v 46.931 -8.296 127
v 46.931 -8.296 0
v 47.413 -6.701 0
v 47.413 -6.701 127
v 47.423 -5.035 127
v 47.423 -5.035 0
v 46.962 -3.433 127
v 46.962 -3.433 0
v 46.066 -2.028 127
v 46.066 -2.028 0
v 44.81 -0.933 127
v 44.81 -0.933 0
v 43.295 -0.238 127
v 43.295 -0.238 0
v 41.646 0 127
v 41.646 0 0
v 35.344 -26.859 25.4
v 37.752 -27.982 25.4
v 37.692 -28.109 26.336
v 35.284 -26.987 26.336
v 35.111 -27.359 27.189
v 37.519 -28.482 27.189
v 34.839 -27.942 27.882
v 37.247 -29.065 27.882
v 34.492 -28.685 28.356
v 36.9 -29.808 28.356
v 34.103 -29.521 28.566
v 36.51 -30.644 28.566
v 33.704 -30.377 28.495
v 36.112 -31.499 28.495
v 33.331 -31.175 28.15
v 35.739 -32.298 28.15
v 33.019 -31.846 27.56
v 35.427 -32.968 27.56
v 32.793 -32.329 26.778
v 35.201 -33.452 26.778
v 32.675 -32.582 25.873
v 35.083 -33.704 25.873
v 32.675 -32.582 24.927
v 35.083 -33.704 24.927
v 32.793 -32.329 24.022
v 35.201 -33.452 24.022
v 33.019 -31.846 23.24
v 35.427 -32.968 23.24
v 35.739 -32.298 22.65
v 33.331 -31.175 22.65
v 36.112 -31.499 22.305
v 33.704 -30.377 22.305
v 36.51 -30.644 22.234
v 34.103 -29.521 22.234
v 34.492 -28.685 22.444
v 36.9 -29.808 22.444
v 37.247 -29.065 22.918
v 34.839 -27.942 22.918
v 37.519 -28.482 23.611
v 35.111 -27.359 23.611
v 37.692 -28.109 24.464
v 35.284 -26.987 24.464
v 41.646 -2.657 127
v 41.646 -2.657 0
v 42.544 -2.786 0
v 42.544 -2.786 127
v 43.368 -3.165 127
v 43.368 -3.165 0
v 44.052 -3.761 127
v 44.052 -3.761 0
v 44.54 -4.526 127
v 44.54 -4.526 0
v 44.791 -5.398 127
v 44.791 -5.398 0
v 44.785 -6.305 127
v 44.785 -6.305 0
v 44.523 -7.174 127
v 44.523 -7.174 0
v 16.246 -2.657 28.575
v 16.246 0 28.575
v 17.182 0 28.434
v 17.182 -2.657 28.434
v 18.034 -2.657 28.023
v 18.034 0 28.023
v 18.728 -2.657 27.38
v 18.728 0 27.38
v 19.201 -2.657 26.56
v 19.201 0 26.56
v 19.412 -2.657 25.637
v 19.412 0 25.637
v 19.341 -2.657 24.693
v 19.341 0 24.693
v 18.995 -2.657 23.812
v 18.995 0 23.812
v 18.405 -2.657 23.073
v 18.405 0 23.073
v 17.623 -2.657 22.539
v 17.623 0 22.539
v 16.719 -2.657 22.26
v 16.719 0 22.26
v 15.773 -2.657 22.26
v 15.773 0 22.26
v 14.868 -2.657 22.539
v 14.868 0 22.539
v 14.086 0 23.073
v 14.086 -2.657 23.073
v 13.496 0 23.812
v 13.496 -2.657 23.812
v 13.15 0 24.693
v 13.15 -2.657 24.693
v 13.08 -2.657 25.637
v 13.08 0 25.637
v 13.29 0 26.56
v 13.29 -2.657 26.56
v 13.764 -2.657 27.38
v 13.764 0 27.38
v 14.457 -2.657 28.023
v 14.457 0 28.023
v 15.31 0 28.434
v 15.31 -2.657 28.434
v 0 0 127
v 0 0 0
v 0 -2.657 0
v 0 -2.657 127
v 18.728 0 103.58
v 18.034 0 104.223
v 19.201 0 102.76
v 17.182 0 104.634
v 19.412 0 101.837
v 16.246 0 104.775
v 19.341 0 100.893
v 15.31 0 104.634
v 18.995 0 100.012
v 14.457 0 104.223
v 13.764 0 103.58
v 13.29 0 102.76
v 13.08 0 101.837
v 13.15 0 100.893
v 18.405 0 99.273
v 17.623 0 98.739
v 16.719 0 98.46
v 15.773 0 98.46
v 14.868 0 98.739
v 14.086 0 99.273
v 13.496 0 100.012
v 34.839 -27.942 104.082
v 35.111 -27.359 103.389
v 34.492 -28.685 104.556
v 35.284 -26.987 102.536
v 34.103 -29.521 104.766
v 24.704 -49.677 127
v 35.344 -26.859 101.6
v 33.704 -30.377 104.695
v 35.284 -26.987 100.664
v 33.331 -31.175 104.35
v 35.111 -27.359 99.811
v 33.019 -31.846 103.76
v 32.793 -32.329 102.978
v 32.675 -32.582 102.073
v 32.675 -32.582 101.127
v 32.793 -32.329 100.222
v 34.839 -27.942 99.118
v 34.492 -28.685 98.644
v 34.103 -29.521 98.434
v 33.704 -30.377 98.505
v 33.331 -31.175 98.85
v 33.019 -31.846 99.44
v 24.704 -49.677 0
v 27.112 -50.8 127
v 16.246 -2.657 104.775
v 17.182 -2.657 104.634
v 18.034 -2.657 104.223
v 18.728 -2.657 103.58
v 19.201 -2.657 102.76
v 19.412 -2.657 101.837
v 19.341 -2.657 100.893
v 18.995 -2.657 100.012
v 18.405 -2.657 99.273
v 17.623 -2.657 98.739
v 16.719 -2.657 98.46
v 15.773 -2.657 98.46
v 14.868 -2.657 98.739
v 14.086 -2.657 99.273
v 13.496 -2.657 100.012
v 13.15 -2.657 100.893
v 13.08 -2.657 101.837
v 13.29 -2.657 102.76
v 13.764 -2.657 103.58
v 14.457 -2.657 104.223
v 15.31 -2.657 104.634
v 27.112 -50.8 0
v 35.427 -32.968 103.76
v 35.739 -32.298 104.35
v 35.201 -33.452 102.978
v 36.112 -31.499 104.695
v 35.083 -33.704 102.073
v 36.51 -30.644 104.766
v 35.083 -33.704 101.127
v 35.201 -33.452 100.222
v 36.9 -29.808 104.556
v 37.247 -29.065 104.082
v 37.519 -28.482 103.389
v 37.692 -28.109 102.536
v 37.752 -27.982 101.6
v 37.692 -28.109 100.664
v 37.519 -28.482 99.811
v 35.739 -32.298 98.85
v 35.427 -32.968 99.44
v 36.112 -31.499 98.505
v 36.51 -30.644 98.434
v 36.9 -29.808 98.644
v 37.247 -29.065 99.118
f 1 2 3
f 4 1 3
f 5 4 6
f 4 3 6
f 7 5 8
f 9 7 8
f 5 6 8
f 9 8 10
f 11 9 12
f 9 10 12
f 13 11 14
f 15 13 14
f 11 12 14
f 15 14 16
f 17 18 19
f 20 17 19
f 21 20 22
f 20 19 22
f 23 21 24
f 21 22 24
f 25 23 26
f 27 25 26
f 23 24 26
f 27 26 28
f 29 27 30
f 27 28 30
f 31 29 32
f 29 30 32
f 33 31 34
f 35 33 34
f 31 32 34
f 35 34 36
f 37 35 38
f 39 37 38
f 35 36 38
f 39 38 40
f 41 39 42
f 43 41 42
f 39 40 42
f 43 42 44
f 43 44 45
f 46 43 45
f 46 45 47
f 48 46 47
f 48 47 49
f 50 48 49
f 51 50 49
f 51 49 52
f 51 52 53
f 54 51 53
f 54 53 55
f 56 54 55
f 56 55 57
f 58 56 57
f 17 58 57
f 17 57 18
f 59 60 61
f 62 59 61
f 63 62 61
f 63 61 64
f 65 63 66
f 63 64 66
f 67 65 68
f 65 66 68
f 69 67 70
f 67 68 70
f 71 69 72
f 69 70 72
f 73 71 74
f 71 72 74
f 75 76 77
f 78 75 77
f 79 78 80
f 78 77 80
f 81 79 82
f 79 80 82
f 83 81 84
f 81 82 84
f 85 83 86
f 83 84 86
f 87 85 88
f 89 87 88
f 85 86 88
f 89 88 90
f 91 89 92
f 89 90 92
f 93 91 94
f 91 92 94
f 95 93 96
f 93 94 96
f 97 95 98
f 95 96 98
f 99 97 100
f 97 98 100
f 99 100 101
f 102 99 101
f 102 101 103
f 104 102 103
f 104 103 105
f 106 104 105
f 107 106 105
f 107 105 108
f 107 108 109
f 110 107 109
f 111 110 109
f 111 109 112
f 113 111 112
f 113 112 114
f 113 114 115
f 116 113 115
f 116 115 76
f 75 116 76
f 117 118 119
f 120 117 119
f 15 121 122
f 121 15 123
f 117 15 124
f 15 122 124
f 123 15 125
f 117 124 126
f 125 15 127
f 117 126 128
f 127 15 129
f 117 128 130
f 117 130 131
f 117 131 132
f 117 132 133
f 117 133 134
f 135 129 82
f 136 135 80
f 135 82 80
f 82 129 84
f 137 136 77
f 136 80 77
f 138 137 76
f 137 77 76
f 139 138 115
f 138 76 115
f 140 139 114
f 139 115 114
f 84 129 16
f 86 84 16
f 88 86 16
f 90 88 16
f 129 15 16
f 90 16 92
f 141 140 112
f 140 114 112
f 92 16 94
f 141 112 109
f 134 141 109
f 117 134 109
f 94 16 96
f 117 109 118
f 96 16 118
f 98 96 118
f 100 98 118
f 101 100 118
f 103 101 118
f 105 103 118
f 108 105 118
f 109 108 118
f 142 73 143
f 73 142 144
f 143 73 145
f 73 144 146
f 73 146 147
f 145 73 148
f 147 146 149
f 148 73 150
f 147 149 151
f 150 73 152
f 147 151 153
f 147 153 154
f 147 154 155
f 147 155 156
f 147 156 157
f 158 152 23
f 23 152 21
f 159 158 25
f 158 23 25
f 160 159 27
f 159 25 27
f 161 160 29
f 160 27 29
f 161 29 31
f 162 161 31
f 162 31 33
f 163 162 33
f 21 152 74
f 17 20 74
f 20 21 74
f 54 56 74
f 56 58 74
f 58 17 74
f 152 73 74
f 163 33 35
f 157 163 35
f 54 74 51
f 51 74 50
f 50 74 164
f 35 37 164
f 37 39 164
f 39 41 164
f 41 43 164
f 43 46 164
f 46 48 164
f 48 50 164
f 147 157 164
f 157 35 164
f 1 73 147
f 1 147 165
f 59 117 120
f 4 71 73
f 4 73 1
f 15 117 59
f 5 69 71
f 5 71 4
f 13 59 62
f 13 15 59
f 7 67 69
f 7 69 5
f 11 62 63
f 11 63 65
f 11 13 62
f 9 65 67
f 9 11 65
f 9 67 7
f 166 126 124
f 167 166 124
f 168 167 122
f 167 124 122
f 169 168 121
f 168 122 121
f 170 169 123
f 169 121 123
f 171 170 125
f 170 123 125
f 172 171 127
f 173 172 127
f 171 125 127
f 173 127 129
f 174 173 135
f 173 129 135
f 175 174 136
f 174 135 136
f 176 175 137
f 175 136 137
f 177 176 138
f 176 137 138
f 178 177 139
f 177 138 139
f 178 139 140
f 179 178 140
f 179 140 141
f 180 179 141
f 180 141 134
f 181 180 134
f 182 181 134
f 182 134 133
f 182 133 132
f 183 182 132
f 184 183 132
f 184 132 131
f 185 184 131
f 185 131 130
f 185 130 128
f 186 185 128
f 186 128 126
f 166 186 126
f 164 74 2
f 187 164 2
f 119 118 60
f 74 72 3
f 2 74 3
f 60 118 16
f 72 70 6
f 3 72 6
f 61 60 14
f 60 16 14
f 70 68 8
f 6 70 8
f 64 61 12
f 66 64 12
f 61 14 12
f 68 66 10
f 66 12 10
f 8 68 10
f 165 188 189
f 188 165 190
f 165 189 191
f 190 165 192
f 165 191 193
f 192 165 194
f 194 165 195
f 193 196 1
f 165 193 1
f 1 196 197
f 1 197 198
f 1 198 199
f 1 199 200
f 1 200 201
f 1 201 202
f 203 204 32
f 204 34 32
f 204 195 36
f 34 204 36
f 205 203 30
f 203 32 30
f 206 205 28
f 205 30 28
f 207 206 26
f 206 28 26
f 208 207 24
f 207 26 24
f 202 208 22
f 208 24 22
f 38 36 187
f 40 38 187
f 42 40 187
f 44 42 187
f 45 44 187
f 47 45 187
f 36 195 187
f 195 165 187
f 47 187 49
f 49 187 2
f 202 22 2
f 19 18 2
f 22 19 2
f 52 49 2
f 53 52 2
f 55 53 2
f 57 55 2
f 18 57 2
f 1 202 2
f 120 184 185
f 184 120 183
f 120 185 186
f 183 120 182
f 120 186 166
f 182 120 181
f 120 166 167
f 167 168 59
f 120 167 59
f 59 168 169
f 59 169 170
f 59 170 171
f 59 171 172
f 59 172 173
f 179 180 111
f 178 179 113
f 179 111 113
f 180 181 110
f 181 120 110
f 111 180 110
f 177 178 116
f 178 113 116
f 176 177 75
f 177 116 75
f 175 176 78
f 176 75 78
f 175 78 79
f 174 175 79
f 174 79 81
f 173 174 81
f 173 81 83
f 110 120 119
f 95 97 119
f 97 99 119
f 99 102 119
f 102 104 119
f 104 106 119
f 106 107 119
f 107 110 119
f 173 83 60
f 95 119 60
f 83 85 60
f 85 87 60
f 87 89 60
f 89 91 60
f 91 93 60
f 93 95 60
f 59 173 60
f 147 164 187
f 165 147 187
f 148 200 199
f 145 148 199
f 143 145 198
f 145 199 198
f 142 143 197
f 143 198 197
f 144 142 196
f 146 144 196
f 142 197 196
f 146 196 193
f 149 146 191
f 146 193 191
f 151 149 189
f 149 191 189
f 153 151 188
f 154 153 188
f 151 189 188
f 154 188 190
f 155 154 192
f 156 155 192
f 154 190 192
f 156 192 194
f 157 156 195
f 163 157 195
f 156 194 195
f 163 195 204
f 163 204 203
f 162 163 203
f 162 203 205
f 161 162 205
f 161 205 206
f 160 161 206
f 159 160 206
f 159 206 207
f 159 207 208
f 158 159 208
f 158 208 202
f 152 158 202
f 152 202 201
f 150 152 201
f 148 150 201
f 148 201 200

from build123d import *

# Parameters (mm, degrees)
BASE_FLANGE1_DEPTH = 127
CUT_EXTRUDE1_REACH = 146.789
SKETCH6_R          = 3.175
CUT_EXTRUDE2_REACH = 139.304
SKETCH7_R          = 3.175


# Read off the part's stored shape, not the designer's step: Base-Flange1
with BuildPart() as part:
    # Base-Flange1 outline → Base-Flange1 (new body)
    with BuildSketch(Plane.XY):
        with BuildLine():
            Line((44.523372088, -7.173652981), (24.703656185, -49.677170897))
            Line((24.703656185, -49.677170897), (27.111570966, -50.8))
            Line((27.111570966, -50.8), (46.931286869, -8.296482084))
            ThreePointArc((46.931286869, -8.296482084), (46.564368833, -2.698394652), (41.645844864, 0))
            Line((41.645844864, 0), (0, 0))
            Line((0, 0), (0, -2.65684))
            Line((0, -2.65684), (41.645844864, -2.65684))
            ThreePointArc((41.645844864, -2.65684), (44.323612704, -4.125913744), (44.523372088, -7.173652981))
        make_face()
    extrude(amount=BASE_FLANGE1_DEPTH)

    # Sketch6 → Cut-Extrude1 (cut, up to next)
    with BuildSketch(Plane(origin=(0, 0, 0), x_dir=(1, 0, 0), z_dir=(0, 1, 0)), mode=Mode.PRIVATE) as cut_extrude1_sk1:
        with Locations(Location((16.245844864, -101.6, 0), (0, 0, 270))):
            Circle(SKETCH6_R)
    cut_extrude1_tool1 = extrude(cut_extrude1_sk1.sketch, amount=-CUT_EXTRUDE1_REACH, mode=Mode.PRIVATE) & part.part
    # Sketch6 → Cut-Extrude1 (cut, up to next)
    with BuildSketch(Plane(origin=(0, 0, 0), x_dir=(1, 0, 0), z_dir=(0, 1, 0)), mode=Mode.PRIVATE) as cut_extrude1_sk2:
        with Locations(Location((16.245844864, -25.4, 0), (0, 0, 270))):
            Circle(SKETCH6_R)
    cut_extrude1_tool2 = extrude(cut_extrude1_sk2.sketch, amount=-CUT_EXTRUDE1_REACH, mode=Mode.PRIVATE) & part.part
    add(cut_extrude1_tool1.solids().sort_by_distance((16.245845, 0, 101.6))[0], mode=Mode.SUBTRACT)
    add(cut_extrude1_tool2.solids().sort_by_distance((16.245845, 0, 25.4))[0], mode=Mode.SUBTRACT)

    # Sketch7 → Cut-Extrude2 (cut, up to next)
    with BuildSketch(Plane(origin=(41.726805286, -19.457528855, 0), x_dir=(0, 0, -1), z_dir=(0.906307787036648, -0.4226182617407038, 0)), mode=Mode.PRIVATE) as cut_extrude2_sk1:
        with Locations(Location((-101.6, -12.580218597, 0), (0, 0, 90))):
            Circle(SKETCH7_R)
    cut_extrude2_tool1 = extrude(cut_extrude2_sk1.sketch, amount=-CUT_EXTRUDE2_REACH, mode=Mode.PRIVATE) & part.part
    # Sketch7 → Cut-Extrude2 (cut, up to next)
    with BuildSketch(Plane(origin=(41.726805286, -19.457528855, 0), x_dir=(0, 0, -1), z_dir=(0.906307787036648, -0.4226182617407038, 0)), mode=Mode.PRIVATE) as cut_extrude2_sk2:
        with Locations(Location((-25.4, -12.580218597, 0), (0, 0, 90))):
            Circle(SKETCH7_R)
    cut_extrude2_tool2 = extrude(cut_extrude2_sk2.sketch, amount=-CUT_EXTRUDE2_REACH, mode=Mode.PRIVATE) & part.part
    add(cut_extrude2_tool1.solids().sort_by_distance((36.410175, -30.859079, 101.6))[0], mode=Mode.SUBTRACT)
    add(cut_extrude2_tool2.solids().sort_by_distance((36.410175, -30.859079, 25.4))[0], mode=Mode.SUBTRACT)


solid = part.part
